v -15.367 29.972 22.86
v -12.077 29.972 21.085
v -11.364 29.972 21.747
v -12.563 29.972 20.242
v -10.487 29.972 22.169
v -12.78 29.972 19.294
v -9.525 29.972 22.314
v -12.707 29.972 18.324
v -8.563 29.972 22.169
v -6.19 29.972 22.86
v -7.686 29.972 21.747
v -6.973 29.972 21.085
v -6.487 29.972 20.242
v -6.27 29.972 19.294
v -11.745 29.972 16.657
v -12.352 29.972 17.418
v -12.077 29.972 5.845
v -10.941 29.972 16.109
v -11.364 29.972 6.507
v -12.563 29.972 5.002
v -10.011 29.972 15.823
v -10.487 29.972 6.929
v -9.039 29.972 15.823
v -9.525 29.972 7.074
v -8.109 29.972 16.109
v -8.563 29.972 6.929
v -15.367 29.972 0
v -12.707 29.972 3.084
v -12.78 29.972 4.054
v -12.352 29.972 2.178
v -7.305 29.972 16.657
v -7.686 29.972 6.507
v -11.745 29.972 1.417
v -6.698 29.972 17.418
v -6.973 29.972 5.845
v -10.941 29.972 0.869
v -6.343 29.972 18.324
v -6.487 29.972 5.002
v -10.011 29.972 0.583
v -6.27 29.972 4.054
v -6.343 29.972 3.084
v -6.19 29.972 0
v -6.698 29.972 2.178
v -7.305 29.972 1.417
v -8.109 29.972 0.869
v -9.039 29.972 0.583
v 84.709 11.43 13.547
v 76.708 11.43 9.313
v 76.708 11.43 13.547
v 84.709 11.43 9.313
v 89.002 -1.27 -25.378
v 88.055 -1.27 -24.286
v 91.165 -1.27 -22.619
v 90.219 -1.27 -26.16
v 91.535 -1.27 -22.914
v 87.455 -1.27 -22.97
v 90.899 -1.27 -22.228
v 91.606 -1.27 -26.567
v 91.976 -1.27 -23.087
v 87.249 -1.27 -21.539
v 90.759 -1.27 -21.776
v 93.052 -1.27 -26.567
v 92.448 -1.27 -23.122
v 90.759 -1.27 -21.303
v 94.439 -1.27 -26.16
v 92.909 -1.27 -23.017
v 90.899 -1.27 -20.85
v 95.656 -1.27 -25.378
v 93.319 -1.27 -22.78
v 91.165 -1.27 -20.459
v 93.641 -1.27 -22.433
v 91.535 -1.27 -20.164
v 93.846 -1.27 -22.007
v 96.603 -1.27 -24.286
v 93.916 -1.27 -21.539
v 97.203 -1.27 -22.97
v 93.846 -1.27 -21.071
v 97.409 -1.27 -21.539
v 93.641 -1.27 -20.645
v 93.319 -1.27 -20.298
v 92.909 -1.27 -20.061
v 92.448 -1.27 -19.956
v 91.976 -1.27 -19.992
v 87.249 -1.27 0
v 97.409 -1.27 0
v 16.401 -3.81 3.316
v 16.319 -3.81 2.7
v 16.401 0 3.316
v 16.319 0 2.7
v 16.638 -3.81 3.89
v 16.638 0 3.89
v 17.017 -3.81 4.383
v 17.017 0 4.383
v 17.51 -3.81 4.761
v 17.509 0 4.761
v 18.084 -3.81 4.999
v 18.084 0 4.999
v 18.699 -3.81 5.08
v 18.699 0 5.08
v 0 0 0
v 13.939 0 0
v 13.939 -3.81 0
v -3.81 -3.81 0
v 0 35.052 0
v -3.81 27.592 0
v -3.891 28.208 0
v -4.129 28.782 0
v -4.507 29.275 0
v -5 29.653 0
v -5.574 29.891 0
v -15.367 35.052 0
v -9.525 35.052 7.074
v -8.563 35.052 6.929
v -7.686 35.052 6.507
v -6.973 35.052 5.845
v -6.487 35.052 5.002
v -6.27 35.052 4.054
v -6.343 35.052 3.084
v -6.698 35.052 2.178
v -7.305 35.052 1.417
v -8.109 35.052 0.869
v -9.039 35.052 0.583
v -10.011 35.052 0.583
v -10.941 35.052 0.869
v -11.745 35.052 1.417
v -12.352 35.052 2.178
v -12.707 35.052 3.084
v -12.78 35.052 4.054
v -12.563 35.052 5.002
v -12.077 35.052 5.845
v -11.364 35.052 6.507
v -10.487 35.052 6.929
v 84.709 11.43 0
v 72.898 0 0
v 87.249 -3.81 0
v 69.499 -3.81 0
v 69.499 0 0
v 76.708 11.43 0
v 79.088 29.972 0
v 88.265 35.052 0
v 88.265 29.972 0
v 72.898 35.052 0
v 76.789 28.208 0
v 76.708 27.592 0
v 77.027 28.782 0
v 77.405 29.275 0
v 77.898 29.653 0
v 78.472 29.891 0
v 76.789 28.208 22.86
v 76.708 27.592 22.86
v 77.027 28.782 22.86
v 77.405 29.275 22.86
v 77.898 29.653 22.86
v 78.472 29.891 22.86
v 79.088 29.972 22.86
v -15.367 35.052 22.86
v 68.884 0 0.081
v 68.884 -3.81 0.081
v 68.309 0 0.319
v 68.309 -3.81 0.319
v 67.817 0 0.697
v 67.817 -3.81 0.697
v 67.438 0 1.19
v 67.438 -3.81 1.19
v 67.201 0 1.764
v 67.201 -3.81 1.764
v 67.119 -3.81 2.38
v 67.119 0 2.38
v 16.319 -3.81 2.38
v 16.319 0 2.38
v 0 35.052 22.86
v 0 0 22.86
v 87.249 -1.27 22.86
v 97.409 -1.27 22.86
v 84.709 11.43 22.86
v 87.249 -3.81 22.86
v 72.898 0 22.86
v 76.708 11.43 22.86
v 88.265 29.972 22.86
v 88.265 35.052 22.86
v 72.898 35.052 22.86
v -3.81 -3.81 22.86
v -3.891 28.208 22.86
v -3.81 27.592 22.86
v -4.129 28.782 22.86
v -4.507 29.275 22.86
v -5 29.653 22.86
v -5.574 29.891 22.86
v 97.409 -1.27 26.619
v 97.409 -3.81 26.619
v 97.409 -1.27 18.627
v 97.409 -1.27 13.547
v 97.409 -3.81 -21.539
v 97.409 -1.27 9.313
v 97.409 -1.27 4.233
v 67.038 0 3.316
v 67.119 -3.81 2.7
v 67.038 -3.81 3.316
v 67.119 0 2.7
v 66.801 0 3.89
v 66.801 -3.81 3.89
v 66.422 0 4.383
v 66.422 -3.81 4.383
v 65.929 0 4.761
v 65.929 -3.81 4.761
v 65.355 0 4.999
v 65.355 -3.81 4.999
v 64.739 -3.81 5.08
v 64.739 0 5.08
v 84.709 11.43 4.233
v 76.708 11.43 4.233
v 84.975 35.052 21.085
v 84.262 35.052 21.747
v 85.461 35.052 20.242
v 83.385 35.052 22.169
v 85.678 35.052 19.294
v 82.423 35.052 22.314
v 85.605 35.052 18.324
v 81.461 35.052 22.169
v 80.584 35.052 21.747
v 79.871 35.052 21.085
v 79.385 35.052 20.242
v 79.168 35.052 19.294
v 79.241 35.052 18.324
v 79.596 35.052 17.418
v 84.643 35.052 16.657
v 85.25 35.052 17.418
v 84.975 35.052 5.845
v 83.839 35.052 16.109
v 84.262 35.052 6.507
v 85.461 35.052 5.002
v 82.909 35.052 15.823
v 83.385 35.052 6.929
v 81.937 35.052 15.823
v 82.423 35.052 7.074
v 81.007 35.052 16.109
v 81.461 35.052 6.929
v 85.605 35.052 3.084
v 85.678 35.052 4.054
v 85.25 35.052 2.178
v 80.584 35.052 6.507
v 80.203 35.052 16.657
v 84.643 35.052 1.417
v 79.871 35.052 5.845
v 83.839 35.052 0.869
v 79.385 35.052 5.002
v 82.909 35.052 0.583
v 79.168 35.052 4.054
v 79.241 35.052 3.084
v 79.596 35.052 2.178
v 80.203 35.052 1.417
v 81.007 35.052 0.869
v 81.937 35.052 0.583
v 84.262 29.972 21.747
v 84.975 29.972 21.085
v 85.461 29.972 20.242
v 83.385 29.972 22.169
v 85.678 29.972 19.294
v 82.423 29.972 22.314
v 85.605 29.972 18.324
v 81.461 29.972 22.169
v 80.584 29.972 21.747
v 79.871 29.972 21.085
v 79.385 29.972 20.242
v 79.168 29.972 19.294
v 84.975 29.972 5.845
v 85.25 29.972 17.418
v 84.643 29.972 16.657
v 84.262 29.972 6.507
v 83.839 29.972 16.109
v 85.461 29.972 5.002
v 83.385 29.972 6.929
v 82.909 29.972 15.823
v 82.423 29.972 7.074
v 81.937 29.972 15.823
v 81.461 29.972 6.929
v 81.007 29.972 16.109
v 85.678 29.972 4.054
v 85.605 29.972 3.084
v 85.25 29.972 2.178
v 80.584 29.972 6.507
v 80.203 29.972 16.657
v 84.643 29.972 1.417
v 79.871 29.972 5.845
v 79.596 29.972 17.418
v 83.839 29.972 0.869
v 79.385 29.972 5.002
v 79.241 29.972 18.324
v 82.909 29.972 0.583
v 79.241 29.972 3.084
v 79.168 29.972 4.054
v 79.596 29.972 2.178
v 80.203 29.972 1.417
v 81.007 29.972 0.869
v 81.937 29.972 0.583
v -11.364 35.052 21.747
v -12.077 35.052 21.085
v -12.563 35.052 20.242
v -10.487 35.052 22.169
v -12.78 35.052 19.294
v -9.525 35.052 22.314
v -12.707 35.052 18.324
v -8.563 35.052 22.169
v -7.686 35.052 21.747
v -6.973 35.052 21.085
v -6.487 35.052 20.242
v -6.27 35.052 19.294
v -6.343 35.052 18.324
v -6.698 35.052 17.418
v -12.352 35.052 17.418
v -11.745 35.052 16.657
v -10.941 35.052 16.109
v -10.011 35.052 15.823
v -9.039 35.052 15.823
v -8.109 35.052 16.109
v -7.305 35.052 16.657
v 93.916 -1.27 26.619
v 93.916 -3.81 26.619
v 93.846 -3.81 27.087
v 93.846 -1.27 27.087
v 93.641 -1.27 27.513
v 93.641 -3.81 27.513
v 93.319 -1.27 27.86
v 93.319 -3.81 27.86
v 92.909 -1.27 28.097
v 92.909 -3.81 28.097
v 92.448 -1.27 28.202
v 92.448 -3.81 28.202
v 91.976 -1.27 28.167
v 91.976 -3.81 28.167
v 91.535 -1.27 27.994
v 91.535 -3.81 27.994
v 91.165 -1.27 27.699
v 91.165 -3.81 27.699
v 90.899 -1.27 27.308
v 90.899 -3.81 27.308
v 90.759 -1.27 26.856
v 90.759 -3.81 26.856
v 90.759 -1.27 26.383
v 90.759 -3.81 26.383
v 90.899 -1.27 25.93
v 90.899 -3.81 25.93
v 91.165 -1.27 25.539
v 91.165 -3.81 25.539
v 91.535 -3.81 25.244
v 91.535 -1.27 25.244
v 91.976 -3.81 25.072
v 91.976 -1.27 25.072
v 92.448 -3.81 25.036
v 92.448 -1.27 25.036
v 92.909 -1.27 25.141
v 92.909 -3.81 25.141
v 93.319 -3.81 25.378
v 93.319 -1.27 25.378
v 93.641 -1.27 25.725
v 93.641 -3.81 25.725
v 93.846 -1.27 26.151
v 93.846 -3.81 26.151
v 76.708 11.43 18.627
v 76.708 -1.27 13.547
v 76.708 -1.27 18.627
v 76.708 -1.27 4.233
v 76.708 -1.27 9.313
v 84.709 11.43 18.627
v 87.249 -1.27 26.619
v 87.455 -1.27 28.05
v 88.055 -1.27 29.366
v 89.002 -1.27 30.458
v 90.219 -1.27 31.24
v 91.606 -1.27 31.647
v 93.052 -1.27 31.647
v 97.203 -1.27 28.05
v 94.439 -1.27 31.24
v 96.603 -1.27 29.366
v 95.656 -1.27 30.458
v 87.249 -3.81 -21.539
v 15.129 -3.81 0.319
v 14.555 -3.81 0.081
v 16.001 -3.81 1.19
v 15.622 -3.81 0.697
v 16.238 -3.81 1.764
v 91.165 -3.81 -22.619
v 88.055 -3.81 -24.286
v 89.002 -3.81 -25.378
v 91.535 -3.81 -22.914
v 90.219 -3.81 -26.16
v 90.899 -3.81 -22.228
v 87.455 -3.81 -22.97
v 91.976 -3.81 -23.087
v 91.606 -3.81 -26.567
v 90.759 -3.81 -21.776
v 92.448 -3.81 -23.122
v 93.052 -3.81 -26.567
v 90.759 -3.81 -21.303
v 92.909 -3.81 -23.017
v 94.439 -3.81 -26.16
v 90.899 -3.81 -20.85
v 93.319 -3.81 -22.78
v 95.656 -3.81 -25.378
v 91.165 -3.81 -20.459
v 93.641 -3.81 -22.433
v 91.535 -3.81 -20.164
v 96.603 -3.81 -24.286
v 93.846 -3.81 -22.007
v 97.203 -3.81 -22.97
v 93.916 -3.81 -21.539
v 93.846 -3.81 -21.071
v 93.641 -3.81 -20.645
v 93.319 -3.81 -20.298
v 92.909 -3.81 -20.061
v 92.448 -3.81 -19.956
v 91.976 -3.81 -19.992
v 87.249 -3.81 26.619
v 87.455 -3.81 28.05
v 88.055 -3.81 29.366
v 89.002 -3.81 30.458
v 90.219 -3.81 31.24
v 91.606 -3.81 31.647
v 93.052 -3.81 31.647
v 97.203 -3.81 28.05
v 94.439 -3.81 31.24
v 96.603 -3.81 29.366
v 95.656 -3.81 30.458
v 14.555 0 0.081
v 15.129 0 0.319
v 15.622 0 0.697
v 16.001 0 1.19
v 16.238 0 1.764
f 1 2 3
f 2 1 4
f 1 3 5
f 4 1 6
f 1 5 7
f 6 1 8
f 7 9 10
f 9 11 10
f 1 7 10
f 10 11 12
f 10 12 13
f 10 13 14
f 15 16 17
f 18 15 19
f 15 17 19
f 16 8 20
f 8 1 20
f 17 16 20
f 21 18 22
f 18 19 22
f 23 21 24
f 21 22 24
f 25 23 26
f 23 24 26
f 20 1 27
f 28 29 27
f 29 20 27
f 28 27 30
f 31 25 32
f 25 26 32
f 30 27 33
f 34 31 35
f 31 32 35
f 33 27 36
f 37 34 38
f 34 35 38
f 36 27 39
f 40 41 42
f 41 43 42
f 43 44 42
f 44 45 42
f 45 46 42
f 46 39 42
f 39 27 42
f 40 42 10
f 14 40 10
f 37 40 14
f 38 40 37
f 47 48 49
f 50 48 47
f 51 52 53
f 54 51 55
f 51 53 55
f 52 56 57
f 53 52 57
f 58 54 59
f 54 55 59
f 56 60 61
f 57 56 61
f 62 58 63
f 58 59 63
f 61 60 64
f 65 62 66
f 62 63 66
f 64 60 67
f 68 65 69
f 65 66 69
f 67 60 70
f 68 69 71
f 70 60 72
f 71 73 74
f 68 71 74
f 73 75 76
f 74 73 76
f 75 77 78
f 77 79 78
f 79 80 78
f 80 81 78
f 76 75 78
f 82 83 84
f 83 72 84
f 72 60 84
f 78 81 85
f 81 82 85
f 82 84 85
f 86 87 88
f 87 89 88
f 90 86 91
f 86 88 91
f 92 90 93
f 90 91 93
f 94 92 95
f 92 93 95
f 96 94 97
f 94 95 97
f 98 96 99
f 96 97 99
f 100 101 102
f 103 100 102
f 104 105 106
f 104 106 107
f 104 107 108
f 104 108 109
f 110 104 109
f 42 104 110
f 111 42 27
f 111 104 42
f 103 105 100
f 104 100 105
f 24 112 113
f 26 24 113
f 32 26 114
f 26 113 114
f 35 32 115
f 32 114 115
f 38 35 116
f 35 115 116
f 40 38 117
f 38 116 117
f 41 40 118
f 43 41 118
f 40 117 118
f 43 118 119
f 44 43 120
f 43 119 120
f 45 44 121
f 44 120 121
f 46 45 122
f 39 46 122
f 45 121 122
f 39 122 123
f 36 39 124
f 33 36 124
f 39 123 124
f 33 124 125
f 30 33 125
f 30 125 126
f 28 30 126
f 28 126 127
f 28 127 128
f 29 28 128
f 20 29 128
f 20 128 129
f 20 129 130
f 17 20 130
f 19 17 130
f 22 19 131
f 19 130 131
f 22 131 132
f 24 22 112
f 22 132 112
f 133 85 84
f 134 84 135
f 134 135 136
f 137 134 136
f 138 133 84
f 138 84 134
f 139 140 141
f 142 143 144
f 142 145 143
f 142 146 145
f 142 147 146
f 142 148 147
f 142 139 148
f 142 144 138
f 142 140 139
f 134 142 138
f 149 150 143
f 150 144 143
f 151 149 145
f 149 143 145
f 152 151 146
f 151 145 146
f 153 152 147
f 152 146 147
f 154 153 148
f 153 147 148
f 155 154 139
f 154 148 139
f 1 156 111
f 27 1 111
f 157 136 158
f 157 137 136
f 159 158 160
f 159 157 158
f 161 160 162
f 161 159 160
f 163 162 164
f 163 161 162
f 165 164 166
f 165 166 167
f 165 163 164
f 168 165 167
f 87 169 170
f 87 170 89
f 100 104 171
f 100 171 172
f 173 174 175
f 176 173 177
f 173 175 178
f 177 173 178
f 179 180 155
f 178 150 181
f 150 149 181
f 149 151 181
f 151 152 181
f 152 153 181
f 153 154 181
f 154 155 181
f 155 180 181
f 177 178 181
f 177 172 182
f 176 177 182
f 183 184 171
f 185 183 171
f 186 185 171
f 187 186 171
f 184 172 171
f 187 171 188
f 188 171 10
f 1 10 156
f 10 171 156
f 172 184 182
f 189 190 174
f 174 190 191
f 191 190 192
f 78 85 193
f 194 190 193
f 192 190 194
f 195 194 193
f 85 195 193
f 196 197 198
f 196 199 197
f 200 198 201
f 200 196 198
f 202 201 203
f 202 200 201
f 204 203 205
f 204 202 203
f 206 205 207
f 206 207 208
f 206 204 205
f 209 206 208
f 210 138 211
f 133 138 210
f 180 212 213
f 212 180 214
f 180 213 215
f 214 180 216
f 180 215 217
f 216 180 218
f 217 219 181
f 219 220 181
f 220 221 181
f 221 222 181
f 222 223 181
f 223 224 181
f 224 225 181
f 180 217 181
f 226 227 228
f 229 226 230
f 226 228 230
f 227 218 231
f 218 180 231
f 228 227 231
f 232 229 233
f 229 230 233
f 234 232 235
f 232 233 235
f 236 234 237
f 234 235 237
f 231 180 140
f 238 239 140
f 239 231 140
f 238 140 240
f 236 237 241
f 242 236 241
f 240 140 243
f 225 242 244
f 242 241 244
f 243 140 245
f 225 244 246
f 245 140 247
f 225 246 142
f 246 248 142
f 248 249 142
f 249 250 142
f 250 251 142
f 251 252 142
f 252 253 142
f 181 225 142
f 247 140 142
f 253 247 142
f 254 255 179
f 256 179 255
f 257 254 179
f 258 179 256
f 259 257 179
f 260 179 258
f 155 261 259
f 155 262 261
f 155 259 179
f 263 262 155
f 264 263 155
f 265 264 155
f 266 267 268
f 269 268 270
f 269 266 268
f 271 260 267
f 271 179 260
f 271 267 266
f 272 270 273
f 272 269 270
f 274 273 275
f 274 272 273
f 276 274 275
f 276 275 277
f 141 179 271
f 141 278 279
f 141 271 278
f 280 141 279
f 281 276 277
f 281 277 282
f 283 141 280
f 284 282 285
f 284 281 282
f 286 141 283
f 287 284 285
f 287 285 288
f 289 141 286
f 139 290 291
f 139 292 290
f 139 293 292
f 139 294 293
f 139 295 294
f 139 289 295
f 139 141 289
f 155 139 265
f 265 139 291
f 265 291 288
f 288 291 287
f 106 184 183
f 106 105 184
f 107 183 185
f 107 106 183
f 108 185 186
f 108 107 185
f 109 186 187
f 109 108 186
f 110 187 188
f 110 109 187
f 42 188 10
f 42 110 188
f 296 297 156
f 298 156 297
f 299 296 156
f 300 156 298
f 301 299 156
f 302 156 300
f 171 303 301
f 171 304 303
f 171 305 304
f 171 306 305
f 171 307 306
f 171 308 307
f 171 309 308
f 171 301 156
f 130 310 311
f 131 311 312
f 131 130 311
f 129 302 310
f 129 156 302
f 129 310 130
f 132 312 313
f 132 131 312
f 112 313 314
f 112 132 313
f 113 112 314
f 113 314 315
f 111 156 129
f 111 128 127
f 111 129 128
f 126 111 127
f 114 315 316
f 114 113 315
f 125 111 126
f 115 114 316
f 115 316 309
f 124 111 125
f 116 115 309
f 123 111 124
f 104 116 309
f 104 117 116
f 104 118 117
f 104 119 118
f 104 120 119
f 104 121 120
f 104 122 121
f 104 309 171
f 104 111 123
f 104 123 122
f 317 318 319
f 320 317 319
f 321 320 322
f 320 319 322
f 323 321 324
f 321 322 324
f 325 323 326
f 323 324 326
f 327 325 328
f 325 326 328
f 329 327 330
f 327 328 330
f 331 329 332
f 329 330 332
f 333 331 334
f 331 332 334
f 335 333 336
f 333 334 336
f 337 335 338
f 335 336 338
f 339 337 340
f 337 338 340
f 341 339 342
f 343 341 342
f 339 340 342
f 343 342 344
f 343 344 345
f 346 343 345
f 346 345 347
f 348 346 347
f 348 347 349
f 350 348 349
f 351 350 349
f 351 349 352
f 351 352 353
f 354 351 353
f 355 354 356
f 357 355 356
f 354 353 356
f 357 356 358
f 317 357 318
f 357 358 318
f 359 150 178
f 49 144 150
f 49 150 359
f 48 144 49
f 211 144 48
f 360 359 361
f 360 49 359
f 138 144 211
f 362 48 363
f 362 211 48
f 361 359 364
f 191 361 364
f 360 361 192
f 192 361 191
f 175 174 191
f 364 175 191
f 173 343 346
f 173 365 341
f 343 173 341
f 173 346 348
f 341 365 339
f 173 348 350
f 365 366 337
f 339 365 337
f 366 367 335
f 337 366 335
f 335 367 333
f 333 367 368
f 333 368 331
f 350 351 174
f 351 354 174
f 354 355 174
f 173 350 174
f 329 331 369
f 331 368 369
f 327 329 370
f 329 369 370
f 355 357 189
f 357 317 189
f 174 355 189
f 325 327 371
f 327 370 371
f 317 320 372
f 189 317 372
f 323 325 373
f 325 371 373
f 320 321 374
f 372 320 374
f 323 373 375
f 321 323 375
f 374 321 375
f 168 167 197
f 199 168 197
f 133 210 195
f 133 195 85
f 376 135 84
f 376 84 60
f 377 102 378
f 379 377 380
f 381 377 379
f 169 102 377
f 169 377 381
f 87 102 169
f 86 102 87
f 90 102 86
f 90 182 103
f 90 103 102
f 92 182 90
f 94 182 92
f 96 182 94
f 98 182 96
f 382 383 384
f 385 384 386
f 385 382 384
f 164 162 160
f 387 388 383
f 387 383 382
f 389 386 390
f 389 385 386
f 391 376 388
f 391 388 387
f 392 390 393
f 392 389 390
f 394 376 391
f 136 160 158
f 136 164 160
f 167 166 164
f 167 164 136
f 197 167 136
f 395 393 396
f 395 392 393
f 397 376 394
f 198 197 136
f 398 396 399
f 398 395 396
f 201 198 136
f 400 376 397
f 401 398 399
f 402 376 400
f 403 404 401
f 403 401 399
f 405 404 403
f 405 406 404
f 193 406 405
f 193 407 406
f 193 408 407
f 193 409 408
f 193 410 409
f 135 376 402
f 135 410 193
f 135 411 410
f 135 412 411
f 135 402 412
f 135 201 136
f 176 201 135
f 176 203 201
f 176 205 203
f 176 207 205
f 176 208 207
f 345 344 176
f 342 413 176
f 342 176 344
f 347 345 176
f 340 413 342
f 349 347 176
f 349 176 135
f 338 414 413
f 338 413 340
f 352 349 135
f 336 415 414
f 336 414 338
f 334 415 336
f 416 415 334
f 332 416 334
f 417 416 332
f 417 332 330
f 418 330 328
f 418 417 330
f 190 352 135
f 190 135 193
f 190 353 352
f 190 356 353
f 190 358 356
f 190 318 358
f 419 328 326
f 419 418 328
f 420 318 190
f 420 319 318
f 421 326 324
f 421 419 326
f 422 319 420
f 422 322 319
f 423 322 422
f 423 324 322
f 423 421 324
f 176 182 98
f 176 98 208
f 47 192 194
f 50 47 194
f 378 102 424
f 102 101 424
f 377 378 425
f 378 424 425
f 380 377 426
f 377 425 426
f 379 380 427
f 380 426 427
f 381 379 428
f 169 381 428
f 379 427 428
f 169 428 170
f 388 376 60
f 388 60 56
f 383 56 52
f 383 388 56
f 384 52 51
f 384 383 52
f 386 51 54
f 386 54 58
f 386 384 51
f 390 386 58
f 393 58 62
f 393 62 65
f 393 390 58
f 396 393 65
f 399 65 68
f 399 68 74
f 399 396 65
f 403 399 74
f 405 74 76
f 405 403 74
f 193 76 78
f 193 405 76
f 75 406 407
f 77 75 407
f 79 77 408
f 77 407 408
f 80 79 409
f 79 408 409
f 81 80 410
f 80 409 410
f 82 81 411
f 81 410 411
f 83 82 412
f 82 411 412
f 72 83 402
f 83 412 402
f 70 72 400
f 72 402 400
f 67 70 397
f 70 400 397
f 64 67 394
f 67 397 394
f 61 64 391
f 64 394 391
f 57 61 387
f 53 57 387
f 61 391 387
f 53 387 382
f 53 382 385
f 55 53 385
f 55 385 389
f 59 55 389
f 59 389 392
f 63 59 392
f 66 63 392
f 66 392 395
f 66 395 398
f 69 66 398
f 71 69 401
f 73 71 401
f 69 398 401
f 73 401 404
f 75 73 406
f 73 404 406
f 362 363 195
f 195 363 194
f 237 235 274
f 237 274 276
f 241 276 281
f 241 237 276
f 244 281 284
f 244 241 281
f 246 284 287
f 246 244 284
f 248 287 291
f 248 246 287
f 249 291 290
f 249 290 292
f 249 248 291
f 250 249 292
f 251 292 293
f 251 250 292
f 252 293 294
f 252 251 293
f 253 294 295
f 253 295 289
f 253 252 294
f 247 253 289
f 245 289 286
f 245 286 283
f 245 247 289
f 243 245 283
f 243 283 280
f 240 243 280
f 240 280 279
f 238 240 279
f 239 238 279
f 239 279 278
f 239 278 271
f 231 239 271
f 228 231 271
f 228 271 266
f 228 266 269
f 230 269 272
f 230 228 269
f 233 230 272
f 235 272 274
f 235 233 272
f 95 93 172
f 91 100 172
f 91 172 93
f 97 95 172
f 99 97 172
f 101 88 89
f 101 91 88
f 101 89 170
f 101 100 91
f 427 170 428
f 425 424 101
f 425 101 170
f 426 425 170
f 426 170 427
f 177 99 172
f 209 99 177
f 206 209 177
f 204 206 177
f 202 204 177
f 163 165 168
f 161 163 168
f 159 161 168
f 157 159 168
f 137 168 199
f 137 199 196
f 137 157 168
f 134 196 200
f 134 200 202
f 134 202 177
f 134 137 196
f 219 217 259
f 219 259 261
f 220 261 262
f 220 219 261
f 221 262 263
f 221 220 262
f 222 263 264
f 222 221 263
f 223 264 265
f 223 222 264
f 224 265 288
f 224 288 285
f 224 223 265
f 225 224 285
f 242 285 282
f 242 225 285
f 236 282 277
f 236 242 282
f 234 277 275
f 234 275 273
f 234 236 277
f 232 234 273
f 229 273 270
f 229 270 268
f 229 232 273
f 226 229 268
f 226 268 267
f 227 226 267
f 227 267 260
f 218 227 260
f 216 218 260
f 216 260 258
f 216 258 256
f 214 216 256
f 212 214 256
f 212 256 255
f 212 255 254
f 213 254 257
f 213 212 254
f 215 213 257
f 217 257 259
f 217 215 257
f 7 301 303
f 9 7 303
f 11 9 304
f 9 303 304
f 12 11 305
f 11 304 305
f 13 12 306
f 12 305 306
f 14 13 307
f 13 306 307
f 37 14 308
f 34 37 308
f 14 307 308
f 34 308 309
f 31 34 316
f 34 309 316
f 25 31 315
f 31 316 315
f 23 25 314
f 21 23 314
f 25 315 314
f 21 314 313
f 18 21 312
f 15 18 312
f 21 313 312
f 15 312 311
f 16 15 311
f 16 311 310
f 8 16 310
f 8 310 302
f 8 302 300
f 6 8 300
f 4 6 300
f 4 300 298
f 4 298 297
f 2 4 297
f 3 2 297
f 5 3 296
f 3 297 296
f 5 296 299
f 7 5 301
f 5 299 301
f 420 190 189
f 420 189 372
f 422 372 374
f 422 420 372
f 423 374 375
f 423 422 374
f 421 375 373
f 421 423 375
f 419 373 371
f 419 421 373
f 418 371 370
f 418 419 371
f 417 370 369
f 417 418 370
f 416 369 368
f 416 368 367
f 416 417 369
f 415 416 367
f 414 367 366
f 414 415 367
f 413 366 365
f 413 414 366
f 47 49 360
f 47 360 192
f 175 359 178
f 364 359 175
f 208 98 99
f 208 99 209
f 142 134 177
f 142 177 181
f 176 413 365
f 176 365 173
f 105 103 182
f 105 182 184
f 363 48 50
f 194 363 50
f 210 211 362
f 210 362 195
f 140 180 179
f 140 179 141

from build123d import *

# Parameters (mm, degrees)
BOSS_EXTRUDE1_DEPTH = 22.86
SKETCH2_R           = 1.5875
BOSS_EXTRUDE2_DEPTH = 2.54
SKETCH4_W           = 15.367
SKETCH4_H           = 22.86
SKETCH4_R           = 3.2639
BOSS_EXTRUDE3_DEPTH = 5.08
SKETCH5_W           = 20.701
SKETCH5_H           = 4.233333333
SKETCH5_H_2         = 4.233333334
BOSS_EXTRUDE4_DEPTH = 12.7
CHAMFER1_SIZE       = 12.7
FILLET1_R           = 2.38
SKETCH6_W           = 50.8
SKETCH6_H           = 5.08
CUT_EXTRUDE1_DEPTH  = 110.560976655
FILLET2_R           = 2.38


with BuildPart() as part:
    # Sketch1 → Boss-Extrude1 (new body)
    with BuildSketch(Plane.XY):
        Polygon((-3.81, 35.052), (0, 35.052), (0, 0), (72.898, 0), (72.898, 35.052), (76.708, 35.052), (76.708, -3.81), (-3.81, -3.81), align=None)
    extrude(amount=BOSS_EXTRUDE1_DEPTH)

    # Sketch2 → Boss-Extrude2 (add)
    with BuildSketch(Plane.XZ.offset(3.81)):
        with BuildLine():
            ThreePointArc((97.409, 26.6192), (92.329, 31.6992), (87.249, 26.6192))
            Line((87.249, 26.6192), (87.249, 22.86))
            Line((87.249, 22.86), (76.708, 22.86))
            Line((76.708, 22.86), (76.708, 0))
            Line((76.708, 0), (87.249, 0))
            Line((87.249, 0), (87.249, -21.5392))
            ThreePointArc((87.249, -21.5392), (92.329, -26.6192), (97.409, -21.5392))
            Line((97.409, -21.5392), (97.409, 26.6192))
        make_face()
        with Locations((92.329, -21.5392)):
            Circle(SKETCH2_R, mode=Mode.SUBTRACT)
        with Locations((92.329, 26.6192)):
            Circle(SKETCH2_R, mode=Mode.SUBTRACT)
    extrude(amount=-BOSS_EXTRUDE2_DEPTH)

    # Sketch4 → Boss-Extrude3 (add)
    with BuildSketch(Plane(origin=(0, 35.052, 0), x_dir=(1, 0, 0), z_dir=(0, 1, 0))):
        with Locations((-7.6835, -11.43)):
            Rectangle(SKETCH4_W, SKETCH4_H)
        with Locations(Location((-9.525, -3.81, 0), (0, 0, 270))):
            Circle(SKETCH4_R, mode=Mode.SUBTRACT)
        with Locations(Location((-9.525, -19.05, 0), (0, 0, 270))):
            Circle(SKETCH4_R, mode=Mode.SUBTRACT)
    boss_extrude3 = extrude(amount=-BOSS_EXTRUDE3_DEPTH)

    # Mirror1: Boss-Extrude3 across plane
    add(boss_extrude3.mirror(Plane(origin=(36.449, 0, 0), x_dir=(0, 0, 1), z_dir=(1, 0, 0))))

    # Sketch5 → Boss-Extrude4 (add)
    with BuildSketch(Plane(origin=(0, -1.27, 0), x_dir=(1, 0, 0), z_dir=(0, 1, 0))):
        with Locations((87.0585, -2.116666667)):
            Rectangle(SKETCH5_W, SKETCH5_H)
        with Locations((87.0585, -20.743333334)):
            Rectangle(SKETCH5_W, SKETCH5_H)
        with Locations((87.0585, -11.43)):
            Rectangle(SKETCH5_W, SKETCH5_H_2)
    extrude(amount=BOSS_EXTRUDE4_DEPTH)

    # Chamfer1
    chamfer1_edges = [part.edges().sort_by_distance(p)[0] for p in [
        (97.409, 11.43, 20.743333333),
        (97.409, 11.43, 11.43),
        (97.409, 11.43, 2.116666667),
    ]]
    chamfer(chamfer1_edges, length=CHAMFER1_SIZE)

    # Fillet1
    fillet1_edges = [part.edges().sort_by_distance(p)[0] for p in [
        (-3.81, 29.972, 11.43),
        (76.708, 29.972, 11.43),
    ]]
    fillet(fillet1_edges, radius=FILLET1_R)

    # Sketch6 → Cut-Extrude1 (cut, through all)
    with BuildSketch(Plane.XZ.offset(3.81)):
        with Locations((41.7195, 2.54)):
            Rectangle(SKETCH6_W, SKETCH6_H)
    extrude(amount=-CUT_EXTRUDE1_DEPTH, mode=Mode.SUBTRACT)

    # Fillet2
    fillet2_edges = [part.edges().sort_by_distance(p)[0] for p in [
        (16.3195, -1.905, 0),
        (67.1195, -1.905, 0),
        (16.3195, -1.905, 5.08),
        (67.1195, -1.905, 5.08),
    ]]
    fillet(fillet2_edges, radius=FILLET2_R)


solid = part.part
